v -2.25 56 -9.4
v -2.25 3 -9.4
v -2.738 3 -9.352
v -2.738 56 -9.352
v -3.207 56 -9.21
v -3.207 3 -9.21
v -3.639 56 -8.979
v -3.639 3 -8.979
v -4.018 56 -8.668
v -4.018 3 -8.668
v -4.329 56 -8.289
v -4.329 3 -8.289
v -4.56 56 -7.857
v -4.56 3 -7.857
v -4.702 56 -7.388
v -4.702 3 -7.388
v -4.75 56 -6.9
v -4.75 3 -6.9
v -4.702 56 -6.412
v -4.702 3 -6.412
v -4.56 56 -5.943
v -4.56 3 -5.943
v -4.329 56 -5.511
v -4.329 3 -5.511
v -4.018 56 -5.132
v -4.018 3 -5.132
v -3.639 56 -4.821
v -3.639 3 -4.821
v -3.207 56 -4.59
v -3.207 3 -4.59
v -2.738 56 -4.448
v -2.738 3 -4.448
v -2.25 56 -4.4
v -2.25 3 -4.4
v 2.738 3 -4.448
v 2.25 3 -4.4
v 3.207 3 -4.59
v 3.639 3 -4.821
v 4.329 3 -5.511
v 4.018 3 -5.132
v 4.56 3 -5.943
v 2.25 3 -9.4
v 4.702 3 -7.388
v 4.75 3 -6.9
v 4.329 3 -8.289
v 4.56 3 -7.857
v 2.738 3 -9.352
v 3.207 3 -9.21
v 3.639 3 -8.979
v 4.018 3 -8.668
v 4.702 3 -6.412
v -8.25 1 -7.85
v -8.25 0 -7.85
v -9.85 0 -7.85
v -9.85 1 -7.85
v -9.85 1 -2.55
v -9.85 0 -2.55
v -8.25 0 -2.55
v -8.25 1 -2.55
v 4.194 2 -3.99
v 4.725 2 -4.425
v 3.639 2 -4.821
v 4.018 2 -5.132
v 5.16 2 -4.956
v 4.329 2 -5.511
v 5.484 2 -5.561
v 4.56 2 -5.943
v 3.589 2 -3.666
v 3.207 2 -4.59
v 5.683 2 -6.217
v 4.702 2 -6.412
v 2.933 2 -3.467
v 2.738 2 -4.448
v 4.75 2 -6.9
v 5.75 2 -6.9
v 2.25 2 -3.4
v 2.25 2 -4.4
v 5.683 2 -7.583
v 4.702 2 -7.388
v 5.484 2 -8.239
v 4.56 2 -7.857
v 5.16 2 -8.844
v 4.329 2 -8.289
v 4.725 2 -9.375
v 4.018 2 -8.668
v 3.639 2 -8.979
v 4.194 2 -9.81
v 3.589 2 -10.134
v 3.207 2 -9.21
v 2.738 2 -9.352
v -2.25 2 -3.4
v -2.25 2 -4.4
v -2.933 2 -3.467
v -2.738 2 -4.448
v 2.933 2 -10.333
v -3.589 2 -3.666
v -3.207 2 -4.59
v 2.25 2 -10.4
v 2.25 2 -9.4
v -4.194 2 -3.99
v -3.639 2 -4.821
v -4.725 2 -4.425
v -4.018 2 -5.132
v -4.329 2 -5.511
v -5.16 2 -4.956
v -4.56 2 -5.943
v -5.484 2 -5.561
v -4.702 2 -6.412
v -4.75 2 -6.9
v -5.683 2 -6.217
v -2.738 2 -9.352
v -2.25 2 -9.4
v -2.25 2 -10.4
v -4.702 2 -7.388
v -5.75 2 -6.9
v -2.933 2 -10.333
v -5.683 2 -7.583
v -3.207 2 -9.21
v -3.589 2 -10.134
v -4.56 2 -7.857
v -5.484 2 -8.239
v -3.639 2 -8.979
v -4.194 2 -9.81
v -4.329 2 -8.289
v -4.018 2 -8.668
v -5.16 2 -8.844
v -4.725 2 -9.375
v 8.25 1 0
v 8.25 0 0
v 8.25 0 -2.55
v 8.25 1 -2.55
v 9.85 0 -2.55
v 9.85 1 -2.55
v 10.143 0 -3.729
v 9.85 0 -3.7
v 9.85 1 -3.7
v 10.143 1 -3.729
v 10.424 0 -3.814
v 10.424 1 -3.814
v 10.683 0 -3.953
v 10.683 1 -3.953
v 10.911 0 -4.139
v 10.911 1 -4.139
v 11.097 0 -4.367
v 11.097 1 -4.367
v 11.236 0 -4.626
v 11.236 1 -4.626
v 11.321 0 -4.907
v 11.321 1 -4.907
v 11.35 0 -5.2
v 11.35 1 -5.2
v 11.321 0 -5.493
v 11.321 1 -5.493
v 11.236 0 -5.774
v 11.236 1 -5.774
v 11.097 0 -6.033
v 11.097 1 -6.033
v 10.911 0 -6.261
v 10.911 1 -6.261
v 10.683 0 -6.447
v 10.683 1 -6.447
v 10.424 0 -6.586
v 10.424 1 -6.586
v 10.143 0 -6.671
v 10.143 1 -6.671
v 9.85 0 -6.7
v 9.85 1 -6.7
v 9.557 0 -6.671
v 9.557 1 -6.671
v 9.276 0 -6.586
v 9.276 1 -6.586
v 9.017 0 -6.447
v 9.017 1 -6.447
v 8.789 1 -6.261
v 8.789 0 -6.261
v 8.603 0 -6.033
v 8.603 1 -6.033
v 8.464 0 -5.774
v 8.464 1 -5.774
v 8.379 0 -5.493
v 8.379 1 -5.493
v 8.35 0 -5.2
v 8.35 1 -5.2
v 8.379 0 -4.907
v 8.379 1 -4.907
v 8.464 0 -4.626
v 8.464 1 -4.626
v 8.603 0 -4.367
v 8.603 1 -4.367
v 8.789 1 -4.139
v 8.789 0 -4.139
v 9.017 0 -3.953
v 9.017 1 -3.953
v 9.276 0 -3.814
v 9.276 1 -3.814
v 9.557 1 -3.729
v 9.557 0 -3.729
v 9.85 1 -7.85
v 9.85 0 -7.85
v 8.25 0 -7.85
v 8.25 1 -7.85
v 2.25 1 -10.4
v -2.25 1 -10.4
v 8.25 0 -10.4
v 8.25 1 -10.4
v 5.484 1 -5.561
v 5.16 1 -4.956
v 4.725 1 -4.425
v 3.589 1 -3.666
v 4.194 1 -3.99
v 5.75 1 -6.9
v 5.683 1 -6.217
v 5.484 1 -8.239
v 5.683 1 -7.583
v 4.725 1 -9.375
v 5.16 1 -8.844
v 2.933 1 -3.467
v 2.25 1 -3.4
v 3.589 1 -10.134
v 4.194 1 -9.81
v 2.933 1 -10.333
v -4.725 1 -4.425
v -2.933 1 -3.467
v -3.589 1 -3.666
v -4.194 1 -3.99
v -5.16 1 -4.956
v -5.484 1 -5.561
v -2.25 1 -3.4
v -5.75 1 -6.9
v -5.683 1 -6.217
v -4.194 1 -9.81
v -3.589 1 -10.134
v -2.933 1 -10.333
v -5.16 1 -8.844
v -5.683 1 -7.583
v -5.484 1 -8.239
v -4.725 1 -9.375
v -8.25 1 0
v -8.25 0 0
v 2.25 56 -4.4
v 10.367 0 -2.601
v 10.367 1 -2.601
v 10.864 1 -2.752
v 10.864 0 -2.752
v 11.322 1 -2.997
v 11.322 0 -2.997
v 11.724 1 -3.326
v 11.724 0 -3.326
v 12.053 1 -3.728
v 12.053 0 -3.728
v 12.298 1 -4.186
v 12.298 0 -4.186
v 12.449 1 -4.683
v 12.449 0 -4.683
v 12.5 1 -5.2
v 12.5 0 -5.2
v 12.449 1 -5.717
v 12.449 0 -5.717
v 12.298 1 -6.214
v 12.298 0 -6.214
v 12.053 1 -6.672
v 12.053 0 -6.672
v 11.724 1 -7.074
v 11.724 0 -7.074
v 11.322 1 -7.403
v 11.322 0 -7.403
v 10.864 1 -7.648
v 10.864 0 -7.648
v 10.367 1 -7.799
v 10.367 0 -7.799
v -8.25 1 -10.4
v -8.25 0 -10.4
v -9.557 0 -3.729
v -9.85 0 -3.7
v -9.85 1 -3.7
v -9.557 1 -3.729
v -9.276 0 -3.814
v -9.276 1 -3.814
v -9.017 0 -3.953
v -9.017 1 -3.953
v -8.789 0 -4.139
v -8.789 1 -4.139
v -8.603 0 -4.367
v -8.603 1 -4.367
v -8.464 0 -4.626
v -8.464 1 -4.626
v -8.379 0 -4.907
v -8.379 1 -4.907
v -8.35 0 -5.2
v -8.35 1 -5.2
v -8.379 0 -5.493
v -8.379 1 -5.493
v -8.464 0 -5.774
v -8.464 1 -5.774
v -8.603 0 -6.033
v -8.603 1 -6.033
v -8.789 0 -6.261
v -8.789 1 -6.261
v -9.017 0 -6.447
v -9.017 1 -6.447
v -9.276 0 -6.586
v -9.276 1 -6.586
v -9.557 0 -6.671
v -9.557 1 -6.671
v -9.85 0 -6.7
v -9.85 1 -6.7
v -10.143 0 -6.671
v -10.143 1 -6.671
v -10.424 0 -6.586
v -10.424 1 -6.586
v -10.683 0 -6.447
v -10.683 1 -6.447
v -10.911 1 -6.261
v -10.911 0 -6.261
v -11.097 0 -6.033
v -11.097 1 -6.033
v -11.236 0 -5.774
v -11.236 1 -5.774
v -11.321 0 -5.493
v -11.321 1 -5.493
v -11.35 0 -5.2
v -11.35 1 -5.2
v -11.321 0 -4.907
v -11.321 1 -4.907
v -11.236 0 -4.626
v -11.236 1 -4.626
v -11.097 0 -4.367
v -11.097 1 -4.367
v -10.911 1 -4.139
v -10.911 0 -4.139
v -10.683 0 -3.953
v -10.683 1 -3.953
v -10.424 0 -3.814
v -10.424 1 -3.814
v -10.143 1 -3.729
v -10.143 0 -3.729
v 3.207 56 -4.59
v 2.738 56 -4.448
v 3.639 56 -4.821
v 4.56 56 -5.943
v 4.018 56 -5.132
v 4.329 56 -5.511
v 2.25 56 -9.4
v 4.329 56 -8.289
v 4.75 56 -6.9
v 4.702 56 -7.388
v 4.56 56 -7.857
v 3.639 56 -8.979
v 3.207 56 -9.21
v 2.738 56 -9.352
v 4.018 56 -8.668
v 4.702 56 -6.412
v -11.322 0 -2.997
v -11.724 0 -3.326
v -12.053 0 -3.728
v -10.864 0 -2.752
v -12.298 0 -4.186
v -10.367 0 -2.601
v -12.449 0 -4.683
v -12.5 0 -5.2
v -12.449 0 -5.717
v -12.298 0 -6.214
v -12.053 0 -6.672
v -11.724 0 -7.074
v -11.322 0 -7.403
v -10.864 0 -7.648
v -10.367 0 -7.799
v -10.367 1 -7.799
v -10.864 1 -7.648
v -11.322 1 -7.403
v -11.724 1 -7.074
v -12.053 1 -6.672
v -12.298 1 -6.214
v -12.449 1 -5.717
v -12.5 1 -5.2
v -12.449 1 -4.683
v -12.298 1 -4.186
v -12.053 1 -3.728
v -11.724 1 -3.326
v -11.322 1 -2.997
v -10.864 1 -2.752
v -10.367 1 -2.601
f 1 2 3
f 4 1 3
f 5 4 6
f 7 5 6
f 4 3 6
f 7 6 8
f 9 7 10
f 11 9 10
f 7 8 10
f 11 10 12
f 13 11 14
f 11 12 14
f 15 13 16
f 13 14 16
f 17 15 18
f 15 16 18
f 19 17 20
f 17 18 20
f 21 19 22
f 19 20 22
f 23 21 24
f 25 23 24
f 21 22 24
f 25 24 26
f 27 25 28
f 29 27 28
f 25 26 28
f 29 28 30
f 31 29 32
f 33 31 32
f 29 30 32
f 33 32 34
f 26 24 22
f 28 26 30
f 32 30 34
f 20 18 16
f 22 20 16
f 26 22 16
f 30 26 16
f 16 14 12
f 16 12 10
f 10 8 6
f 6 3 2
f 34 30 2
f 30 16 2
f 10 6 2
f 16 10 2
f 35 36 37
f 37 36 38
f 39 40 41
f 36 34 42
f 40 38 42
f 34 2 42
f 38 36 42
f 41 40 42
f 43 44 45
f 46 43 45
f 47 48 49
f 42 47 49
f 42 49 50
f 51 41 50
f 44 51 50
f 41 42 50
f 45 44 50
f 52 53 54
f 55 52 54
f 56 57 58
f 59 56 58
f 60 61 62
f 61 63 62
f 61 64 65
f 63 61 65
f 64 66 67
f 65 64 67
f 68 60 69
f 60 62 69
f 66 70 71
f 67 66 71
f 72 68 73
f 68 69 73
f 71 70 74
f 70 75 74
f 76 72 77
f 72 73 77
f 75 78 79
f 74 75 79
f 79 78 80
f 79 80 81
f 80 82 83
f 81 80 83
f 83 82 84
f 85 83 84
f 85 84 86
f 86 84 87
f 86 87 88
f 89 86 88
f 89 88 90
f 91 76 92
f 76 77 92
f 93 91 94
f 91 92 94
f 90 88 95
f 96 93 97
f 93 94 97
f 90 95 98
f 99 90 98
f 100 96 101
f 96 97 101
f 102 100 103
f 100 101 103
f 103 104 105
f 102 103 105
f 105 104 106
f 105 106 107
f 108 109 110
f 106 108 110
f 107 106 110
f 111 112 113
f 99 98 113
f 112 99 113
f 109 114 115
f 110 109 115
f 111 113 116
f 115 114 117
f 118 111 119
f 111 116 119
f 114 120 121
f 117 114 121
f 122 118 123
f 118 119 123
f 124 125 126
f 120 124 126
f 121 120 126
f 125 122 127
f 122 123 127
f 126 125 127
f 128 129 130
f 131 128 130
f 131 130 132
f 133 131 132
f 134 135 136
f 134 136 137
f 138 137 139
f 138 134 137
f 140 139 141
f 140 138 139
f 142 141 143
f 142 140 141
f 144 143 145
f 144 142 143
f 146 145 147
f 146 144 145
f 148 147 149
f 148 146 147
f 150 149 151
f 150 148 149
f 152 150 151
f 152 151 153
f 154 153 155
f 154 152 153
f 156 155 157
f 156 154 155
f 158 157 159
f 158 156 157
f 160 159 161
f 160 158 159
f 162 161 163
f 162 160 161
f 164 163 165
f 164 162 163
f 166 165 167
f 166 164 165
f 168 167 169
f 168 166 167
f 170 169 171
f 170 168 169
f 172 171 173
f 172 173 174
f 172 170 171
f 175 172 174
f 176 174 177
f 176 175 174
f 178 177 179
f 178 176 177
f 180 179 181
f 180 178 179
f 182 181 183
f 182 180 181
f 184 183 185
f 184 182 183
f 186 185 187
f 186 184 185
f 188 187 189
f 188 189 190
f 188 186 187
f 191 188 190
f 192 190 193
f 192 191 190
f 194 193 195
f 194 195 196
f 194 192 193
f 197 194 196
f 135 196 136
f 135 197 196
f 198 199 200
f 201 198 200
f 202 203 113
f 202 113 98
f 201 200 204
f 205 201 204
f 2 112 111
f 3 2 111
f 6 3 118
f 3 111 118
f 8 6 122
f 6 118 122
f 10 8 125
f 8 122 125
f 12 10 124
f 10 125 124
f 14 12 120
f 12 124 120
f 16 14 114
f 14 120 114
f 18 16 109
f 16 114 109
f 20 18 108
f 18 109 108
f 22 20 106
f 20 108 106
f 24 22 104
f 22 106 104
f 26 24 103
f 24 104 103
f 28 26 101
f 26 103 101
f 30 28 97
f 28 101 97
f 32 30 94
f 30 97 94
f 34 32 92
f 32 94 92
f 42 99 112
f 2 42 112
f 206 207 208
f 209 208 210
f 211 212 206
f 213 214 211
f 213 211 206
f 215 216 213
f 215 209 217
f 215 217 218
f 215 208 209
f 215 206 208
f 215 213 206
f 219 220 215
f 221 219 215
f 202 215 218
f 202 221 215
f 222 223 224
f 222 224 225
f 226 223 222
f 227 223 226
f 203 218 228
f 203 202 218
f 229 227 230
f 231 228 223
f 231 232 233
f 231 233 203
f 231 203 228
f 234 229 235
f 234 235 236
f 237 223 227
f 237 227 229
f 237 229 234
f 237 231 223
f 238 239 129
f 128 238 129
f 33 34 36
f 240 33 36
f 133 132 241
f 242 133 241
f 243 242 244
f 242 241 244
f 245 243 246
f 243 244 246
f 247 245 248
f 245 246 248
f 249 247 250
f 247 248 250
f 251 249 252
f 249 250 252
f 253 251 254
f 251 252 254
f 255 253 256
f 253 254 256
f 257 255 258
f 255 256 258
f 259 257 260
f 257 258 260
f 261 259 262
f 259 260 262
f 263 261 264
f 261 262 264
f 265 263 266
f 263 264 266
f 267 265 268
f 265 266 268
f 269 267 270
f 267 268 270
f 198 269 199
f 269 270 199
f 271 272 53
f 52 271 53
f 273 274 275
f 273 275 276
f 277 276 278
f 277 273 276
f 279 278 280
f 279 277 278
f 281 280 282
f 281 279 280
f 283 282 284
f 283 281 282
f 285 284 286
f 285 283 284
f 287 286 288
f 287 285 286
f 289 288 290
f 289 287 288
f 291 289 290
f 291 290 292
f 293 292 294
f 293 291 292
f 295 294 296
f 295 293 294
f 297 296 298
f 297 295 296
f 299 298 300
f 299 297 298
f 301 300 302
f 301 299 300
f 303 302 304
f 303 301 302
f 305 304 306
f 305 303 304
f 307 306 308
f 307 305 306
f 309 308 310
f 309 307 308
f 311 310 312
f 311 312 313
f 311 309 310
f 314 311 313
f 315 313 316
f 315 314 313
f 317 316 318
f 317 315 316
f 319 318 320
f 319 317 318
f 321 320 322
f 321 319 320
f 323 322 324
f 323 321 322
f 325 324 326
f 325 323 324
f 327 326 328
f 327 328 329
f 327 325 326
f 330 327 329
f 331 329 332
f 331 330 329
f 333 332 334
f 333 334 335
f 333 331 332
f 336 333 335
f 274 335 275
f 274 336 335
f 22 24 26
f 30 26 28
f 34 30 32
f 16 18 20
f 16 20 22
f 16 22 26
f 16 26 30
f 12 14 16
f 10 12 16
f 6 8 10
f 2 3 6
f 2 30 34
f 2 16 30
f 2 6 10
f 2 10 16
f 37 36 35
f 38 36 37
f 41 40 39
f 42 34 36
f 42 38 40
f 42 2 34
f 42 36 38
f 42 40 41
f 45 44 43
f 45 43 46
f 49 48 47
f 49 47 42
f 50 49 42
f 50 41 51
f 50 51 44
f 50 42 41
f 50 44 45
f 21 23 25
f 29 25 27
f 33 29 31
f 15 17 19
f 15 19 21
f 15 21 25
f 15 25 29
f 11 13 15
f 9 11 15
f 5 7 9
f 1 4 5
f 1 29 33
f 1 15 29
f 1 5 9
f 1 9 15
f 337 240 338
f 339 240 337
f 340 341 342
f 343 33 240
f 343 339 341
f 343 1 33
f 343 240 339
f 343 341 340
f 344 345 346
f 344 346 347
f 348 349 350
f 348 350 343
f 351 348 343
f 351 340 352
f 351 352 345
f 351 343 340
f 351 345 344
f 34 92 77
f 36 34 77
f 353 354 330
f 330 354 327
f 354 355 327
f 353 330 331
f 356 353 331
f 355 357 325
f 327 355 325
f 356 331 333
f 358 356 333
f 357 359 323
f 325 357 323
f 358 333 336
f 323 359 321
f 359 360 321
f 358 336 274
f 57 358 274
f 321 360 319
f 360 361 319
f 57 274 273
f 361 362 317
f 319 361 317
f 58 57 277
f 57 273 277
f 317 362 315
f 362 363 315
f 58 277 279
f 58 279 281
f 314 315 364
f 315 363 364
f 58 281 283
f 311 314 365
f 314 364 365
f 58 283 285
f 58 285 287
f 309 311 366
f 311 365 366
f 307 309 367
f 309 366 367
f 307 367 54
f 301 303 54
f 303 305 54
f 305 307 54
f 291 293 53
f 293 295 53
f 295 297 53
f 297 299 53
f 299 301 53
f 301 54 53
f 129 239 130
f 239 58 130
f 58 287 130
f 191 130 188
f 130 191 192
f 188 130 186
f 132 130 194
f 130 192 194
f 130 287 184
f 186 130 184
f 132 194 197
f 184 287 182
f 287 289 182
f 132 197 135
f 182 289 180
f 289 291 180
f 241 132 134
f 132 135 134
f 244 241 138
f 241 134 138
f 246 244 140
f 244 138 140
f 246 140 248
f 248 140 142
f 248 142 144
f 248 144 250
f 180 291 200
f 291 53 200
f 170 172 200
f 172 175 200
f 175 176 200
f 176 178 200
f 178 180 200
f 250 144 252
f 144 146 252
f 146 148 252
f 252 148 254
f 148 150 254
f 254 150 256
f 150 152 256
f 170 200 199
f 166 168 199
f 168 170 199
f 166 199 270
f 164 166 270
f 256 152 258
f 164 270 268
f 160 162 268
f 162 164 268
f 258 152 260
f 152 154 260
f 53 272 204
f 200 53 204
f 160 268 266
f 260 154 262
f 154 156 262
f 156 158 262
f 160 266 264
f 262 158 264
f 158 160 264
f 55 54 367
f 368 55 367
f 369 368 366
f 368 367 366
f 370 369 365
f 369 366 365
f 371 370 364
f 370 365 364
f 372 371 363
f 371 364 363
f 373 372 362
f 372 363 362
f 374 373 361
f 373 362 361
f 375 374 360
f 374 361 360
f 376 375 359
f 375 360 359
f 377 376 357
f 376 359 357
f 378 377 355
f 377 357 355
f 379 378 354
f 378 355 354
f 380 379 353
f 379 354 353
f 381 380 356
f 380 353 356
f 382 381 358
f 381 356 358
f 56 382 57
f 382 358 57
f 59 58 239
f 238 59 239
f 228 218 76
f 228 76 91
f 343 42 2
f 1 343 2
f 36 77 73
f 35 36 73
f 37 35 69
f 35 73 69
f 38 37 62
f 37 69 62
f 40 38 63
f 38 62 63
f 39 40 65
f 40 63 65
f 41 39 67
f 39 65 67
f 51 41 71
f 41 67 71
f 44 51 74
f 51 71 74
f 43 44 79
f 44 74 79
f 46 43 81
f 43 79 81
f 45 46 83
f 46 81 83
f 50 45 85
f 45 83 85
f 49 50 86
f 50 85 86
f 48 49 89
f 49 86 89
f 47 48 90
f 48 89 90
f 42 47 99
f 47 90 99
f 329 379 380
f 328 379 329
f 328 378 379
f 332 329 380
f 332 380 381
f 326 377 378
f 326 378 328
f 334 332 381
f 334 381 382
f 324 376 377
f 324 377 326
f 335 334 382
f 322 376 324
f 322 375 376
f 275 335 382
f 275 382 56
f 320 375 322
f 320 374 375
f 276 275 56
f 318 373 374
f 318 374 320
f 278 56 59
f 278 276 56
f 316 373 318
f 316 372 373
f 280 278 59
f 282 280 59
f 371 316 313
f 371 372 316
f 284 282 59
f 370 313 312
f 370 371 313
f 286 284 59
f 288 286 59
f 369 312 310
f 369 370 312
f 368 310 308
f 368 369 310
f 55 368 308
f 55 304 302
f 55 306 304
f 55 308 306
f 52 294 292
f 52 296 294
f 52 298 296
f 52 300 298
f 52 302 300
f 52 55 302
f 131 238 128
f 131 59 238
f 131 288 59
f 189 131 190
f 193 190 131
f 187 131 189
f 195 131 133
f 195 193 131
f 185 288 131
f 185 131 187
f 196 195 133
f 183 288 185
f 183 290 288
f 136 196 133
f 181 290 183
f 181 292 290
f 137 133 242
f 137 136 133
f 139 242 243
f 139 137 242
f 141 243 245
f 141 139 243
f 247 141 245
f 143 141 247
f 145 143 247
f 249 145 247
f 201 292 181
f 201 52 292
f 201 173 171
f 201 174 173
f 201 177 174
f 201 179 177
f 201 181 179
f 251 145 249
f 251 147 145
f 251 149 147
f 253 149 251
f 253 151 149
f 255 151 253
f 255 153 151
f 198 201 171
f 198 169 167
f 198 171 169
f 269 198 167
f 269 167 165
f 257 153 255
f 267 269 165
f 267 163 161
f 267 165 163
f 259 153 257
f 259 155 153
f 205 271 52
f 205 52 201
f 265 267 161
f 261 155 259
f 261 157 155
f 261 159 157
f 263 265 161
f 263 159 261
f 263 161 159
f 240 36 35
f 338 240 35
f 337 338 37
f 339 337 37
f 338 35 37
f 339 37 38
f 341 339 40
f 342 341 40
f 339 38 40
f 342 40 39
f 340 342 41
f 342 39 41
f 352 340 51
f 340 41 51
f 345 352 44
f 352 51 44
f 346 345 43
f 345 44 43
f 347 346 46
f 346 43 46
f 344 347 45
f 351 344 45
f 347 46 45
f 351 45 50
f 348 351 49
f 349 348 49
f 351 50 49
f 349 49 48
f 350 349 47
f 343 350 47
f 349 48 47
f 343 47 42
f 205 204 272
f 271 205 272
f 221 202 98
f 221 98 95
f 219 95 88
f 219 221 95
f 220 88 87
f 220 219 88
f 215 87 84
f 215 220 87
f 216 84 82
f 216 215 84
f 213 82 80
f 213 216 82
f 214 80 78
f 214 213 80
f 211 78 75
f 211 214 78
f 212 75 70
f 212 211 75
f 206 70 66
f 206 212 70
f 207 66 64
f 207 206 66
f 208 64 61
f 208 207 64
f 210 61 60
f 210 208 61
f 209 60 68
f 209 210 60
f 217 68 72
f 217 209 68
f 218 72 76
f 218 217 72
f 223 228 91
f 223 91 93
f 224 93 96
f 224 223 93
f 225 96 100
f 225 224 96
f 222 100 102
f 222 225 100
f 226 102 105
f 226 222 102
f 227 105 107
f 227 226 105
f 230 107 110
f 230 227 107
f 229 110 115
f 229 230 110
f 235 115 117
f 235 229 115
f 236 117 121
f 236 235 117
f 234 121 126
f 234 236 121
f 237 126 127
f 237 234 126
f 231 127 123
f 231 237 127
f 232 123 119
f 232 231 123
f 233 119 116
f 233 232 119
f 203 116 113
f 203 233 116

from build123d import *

# Parameters (mm, degrees)
SKETCH1_R           = 1.5
BOSS_EXTRUDE1_DEPTH = 1
BOSS_EXTRUDE2_DEPTH = 1
BOSS_EXTRUDE4_DEPTH = 1
BOSS_EXTRUDE5_DEPTH = 53


with BuildPart() as part:
    # Sketch1 → Boss-Extrude1 (new body)
    with BuildSketch(Plane(origin=(0, 0, 0), x_dir=(1, 0, 0), z_dir=(0, 1, 0))):
        with BuildLine():
            Line((-8.25, 0), (8.25, 0))
            Line((8.25, 0), (8.25, 2.55))
            Line((8.25, 2.55), (9.85, 2.55))
            ThreePointArc((9.85, 2.55), (12.5, 5.2), (9.85, 7.85))
            Line((9.85, 7.85), (8.25, 7.85))
            Line((8.25, 7.85), (8.25, 10.4))
            Line((8.25, 10.4), (-8.25, 10.4))
            Line((-8.25, 10.4), (-8.25, 7.85))
            Line((-8.25, 7.85), (-9.85, 7.85))
            ThreePointArc((-9.85, 7.85), (-12.5, 5.2), (-9.85, 2.55))
            Line((-9.85, 2.55), (-8.25, 2.55))
            Line((-8.25, 2.55), (-8.25, 0))
        make_face()
        with Locations(Location((9.85, 5.2, 0), (0, 0, 270))):
            Circle(SKETCH1_R, mode=Mode.SUBTRACT)
        with Locations(Location((-9.85, 5.2, 0), (0, 0, 270))):
            Circle(SKETCH1_R, mode=Mode.SUBTRACT)
    extrude(amount=BOSS_EXTRUDE1_DEPTH)


with BuildPart() as body_2:
    # Sketch2 → Boss-Extrude2 (new body)
    with BuildSketch(Plane(origin=(0, 1, 0), x_dir=(1, 0, 0), z_dir=(0, 1, 0))):
        with BuildLine():
            Line((-2.25, 10.4), (2.25, 10.4))
            ThreePointArc((2.25, 10.4), (5.75, 6.9), (2.25, 3.4))
            Line((2.25, 3.4), (-2.25, 3.4))
            ThreePointArc((-2.25, 3.4), (-5.75, 6.9), (-2.25, 10.4))
        make_face()
    extrude(amount=BOSS_EXTRUDE2_DEPTH)

    # Sketch3 → Boss-Extrude4 (add)
    with BuildSketch(Plane(origin=(0, 2, 0), x_dir=(1, 0, 0), z_dir=(0, 1, 0))):
        with BuildLine():
            Line((-2.25, 4.4), (2.25, 4.4))
            ThreePointArc((2.25, 4.4), (4.75, 6.9), (2.25, 9.4))
            Line((2.25, 9.4), (-2.25, 9.4))
            ThreePointArc((-2.25, 9.4), (-4.75, 6.9), (-2.25, 4.4))
        make_face()
    extrude(amount=BOSS_EXTRUDE4_DEPTH)


with BuildPart() as body_3:
    # Sketch4 → Boss-Extrude5 (new body)
    with BuildSketch(Plane(origin=(0, 3, 0), x_dir=(1, 0, 0), z_dir=(0, 1, 0))):
        with BuildLine():
            Line((-2.25, 4.4), (2.25, 4.4))
            ThreePointArc((2.25, 4.4), (4.75, 6.9), (2.25, 9.4))
            Line((2.25, 9.4), (-2.25, 9.4))
            ThreePointArc((-2.25, 9.4), (-4.75, 6.9), (-2.25, 4.4))
        make_face()
    extrude(amount=BOSS_EXTRUDE5_DEPTH)


solid = Compound([part.part, body_2.part, body_3.part])
